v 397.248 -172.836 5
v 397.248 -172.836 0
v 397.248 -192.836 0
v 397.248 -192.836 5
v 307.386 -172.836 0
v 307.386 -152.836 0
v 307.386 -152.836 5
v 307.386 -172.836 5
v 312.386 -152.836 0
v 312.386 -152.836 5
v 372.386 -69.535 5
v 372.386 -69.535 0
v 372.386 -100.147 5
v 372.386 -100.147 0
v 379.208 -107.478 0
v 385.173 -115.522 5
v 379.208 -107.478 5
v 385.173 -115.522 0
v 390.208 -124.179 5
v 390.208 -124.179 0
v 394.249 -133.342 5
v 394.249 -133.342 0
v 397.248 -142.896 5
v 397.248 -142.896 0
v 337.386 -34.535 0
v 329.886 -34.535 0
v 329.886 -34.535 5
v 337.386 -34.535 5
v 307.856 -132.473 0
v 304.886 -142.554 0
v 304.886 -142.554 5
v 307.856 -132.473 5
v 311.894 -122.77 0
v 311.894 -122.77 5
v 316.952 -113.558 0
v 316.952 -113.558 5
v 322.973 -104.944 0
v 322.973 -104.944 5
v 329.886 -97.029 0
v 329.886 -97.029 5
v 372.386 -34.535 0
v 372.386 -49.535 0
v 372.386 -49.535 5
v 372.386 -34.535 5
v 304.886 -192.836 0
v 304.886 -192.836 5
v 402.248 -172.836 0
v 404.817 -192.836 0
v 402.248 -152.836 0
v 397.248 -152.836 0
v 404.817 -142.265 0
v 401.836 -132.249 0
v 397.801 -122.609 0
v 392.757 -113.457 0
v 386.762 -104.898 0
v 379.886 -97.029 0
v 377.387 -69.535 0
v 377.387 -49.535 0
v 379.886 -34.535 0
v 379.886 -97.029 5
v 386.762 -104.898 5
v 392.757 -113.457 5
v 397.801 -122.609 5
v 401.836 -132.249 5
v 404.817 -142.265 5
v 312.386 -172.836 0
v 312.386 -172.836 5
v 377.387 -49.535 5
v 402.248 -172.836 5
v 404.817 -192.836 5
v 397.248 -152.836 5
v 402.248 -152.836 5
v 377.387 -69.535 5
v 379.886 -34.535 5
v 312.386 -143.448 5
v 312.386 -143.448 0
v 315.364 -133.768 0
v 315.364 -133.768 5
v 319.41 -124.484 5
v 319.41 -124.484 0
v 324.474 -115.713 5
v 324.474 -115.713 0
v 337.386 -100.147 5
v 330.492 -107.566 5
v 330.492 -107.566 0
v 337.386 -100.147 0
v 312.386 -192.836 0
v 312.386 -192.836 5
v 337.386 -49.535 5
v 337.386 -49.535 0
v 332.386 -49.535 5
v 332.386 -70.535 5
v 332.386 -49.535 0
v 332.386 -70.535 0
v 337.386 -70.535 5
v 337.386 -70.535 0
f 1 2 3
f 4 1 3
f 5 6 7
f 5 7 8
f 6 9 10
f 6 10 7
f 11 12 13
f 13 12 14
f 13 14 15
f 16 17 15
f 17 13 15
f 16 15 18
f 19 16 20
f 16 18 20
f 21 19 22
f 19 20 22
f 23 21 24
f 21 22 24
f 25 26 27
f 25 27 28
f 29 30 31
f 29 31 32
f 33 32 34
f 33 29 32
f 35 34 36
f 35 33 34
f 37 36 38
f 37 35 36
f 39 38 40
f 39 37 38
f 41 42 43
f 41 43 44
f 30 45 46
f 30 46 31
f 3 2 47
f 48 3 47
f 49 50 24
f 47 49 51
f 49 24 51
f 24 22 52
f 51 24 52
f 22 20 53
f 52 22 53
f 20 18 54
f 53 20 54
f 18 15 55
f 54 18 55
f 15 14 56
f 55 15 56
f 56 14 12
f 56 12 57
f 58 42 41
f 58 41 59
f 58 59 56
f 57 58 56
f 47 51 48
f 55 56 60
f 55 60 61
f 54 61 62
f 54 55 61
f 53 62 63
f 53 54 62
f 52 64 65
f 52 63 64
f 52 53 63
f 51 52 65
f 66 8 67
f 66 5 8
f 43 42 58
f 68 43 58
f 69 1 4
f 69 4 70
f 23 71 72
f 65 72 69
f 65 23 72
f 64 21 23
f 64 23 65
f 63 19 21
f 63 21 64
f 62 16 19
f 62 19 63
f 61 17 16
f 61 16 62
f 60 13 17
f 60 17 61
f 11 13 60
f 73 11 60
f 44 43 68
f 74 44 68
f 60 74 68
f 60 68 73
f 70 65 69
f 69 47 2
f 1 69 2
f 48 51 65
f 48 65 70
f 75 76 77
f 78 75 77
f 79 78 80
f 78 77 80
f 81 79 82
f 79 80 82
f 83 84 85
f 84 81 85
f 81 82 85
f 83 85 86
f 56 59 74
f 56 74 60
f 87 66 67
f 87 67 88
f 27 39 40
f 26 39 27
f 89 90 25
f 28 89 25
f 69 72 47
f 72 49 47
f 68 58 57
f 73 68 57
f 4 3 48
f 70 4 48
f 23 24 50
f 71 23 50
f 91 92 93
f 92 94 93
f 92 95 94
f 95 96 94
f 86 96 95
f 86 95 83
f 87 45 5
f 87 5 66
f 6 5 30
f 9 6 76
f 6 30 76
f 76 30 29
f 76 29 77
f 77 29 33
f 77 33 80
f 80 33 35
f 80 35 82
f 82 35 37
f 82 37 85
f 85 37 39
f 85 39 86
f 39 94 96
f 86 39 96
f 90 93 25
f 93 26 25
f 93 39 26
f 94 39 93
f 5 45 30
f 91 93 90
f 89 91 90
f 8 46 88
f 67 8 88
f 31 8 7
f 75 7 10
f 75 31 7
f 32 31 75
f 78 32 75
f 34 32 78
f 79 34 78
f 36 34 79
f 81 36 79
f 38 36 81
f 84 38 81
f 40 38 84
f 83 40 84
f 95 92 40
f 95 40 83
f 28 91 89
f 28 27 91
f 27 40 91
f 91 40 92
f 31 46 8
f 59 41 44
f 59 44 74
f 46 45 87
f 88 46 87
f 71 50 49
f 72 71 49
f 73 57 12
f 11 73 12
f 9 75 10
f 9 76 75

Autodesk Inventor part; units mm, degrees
ref_plane "YZ Plane" through (0, 0, 0) normal (1, 0, 0) x (0, 1, 0)
ref_plane "XZ Plane" through (0, 0, 0) normal (0, 1, 0) x (-1, 0, 0)
ref_plane "XY Plane" through (0, 0, 0) normal (0, 0, 1) x (1, 0, 0)
sketch "Sketch2" plane through (0, 0, 0) normal (0, 0, 1) x (1, 0, 0)
  line L0 (372.3862, -40.1471) -> (372.3862, -100.1471)
  line L1 (337.3862, -40.1471) -> (337.3862, -100.1471)
  arc A0 (337.3862, -100.1471) -> (312.3862, -143.4484) centre (399.761, -165.0268) ccw
  line L2 (337.3862, -100.1471) -> (312.3862, -143.4484) construction
  line L3 (337.3862, -100.1471) -> (387.3862, -100.1471) construction
  line L4 (312.3862, -143.4484) -> (312.3862, -193.4484)
  arc A1 (397.248, -142.8964) -> (372.3862, -100.1471) centre (310.0113, -165.0268) ccw
  line L5 (397.248, -142.8964) -> (397.248, -192.8358)
  line L6 (347.3862, -193.4484) -> (347.3862, -148.2378)
  arc A2 (354.8862, -133.2267) -> (347.3862, -148.2378) centre (399.761, -165.0268) ccw
  arc A3 (362.248, -147.8127) -> (354.8862, -133.2267) centre (310.0113, -165.0268) ccw
  line L7 (362.248, -147.8127) -> (362.248, -192.8358)
  line L8 (304.8862, -192.8358) -> (304.8862, -142.5545)
  arc A4 (329.8862, -97.0286) -> (304.8862, -142.5545) centre (399.761, -165.0268) ccw
  line L9 (329.8862, -97.0286) -> (329.8862, -34.5346)
  line L10 (329.8862, -34.5346) -> (379.8862, -34.5346)
  line L11 (379.8862, -34.5346) -> (379.8862, -97.0286)
  arc A5 (404.8171, -142.2648) -> (379.8862, -97.0286) centre (310.0113, -165.0268) ccw
  line L12 (404.8171, -142.2648) -> (404.8171, -192.8358)
  line L13 (304.8862, -192.8358) -> (404.8171, -192.8358)
  line L14 (337.3862, -40.1471) -> (337.3862, -34.5346)
  line L15 (372.3862, -40.1471) -> (372.3862, -34.5346)
  line L16 (357.248, -192.8358) -> (357.248, -157.2921)
  line L17 (352.3862, -157.2921) -> (352.3862, -193.4484)
  line L18 (347.3862, -157.2921) -> (352.3862, -157.2921)
  line L19 (357.248, -157.2921) -> (362.248, -157.2921)
  line L20 (372.0272, -40.1471) -> (372.3862, -40.1471)
  line L21 (337.3862, -69.5346) -> (337.3862, -49.5346)
  line L22 (372.3862, -69.5346) -> (372.3862, -49.5346)
  line L23 (397.248, -172.8358) -> (397.248, -152.8358)
  line L24 (312.3862, -152.8358) -> (312.3862, -172.8358)
  line L25 (402.6367, -151.8358) -> (407.6367, -151.8358)
  line L26 (407.6367, -151.8358) -> (407.6367, -172.8358)
  line L27 (372.3862, -70.5346) -> (372.3862, -49.5346)
  line L28 (332.3862, -49.5346) -> (337.3862, -49.5346)
  line L29 (337.3862, -49.5346) -> (337.3862, -70.5346)
  line L30 (337.3862, -70.5346) -> (332.3862, -70.5346)
  line L31 (332.3862, -70.5346) -> (332.3862, -49.5346)
  line L32 (372.3862, -49.5346) -> (377.3866, -49.5346)
  line L33 (377.3866, -49.5346) -> (377.3866, -69.5346)
  line L34 (377.3866, -69.5346) -> (372.3862, -69.5346)
  line L35 (372.3862, -69.5346) -> (372.3862, -49.5346)
  line L36 (345.3862, -34.5346) -> (356.3862, -34.5346) construction
  line L37 (370.8862, -44.0609) -> (365.3862, -34.5346)
  line L38 (345.3862, -34.5346) -> (339.8862, -44.0609)
  line L39 (339.8862, -44.0609) -> (370.8862, -44.0609)
  line L40 (312.3862, -152.8358) -> (307.3862, -152.8358)
  line L41 (307.3862, -152.8358) -> (307.3862, -172.8358)
  line L42 (307.3862, -172.8358) -> (312.3862, -172.8358)
  line L43 (312.3862, -172.8358) -> (312.3862, -152.8358)
  line L44 (397.248, -152.8358) -> (402.248, -152.8358)
  line L45 (402.248, -152.8358) -> (402.248, -172.8358)
  line L46 (402.248, -172.8358) -> (397.248, -172.8358)
  line L47 (397.248, -172.8358) -> (397.248, -152.8358)
  point P0 (323.5989, -71.7026)
  point P1 (312.3862, -192.8358)
  dimension "d111" = 35
  dimension "d112" = 60
  dimension "d113" = 50
  dimension "d114" = 120
  dimension "d115" = 90
  dimension "d116" = 50
  dimension "d117" = 35
  dimension "d118" = 7.5
  dimension "d119" = 5
  dimension "d120" = 7.5
  dimension "d121" = 158.3013
  dimension "d122" = 0
  dimension "d123" = 21
  dimension "d124" = 5
  dimension "d125" = 21
  dimension "d126" = 15
  dimension "d127" = 2.5
  dimension "d128" = 15
  dimension "d129" = 5.0004
  dimension "d130" = 20
  dimension "d131" = 90
  dimension "d132" = 90
  dimension "d133" = 2.8196
  dimension "d134" = 10.3887
  dimension "d135" = 27.7505
  dimension "d136" = 30.2501
  dimension "d137" = 45.3887
  dimension "d138" = 55.2505
  dimension "d139" = 111.6887
  dimension "d140" = 51.6887
  dimension "d141" = 5.4563
  dimension "d142" = 84.0378
  dimension "d143" = 80.1333
  dimension "d144" = 9.571
  dimension "d145" = 1
  dimension "d146" = 102.3013
  dimension "d147" = 82.3013
  dimension "d148" = 81.3013
  dimension "d149" = 41.6125
  dimension "d150" = 41.6125
  dimension "d151" = 102.3013
  dimension "d152" = 82.3013
  dimension "d153" = 1
  dimension "d154" = 21
  dimension "d155" = 11
  dimension "d156" = 120
  dimension "d157" = 31
  dimension "d158" = 11
  dimension "d159" = 60
  dimension "d160" = 14.5
  dimension "d161" = 5
  dimension "d162" = 20
  dimension "d163" = 5
  dimension "d164" = 20
  dimension "d165" = 20
  dimension "d166" = 20
extrude "Extrusion2" add sketch "Sketch2" along normal blind 5 contours L15 L10 L11 A5 L12 L13 L5 L46 L45 L44 A1 L0 L34 L33 L32 | L14 L1 L28 L31 L30 A0 L4 L40 L41 L42 L13 L8 A4 L9 L10
equation "\"d120\" = d118"
equation "\"d128\" = d126"
properties part number "middlelsidewall"
